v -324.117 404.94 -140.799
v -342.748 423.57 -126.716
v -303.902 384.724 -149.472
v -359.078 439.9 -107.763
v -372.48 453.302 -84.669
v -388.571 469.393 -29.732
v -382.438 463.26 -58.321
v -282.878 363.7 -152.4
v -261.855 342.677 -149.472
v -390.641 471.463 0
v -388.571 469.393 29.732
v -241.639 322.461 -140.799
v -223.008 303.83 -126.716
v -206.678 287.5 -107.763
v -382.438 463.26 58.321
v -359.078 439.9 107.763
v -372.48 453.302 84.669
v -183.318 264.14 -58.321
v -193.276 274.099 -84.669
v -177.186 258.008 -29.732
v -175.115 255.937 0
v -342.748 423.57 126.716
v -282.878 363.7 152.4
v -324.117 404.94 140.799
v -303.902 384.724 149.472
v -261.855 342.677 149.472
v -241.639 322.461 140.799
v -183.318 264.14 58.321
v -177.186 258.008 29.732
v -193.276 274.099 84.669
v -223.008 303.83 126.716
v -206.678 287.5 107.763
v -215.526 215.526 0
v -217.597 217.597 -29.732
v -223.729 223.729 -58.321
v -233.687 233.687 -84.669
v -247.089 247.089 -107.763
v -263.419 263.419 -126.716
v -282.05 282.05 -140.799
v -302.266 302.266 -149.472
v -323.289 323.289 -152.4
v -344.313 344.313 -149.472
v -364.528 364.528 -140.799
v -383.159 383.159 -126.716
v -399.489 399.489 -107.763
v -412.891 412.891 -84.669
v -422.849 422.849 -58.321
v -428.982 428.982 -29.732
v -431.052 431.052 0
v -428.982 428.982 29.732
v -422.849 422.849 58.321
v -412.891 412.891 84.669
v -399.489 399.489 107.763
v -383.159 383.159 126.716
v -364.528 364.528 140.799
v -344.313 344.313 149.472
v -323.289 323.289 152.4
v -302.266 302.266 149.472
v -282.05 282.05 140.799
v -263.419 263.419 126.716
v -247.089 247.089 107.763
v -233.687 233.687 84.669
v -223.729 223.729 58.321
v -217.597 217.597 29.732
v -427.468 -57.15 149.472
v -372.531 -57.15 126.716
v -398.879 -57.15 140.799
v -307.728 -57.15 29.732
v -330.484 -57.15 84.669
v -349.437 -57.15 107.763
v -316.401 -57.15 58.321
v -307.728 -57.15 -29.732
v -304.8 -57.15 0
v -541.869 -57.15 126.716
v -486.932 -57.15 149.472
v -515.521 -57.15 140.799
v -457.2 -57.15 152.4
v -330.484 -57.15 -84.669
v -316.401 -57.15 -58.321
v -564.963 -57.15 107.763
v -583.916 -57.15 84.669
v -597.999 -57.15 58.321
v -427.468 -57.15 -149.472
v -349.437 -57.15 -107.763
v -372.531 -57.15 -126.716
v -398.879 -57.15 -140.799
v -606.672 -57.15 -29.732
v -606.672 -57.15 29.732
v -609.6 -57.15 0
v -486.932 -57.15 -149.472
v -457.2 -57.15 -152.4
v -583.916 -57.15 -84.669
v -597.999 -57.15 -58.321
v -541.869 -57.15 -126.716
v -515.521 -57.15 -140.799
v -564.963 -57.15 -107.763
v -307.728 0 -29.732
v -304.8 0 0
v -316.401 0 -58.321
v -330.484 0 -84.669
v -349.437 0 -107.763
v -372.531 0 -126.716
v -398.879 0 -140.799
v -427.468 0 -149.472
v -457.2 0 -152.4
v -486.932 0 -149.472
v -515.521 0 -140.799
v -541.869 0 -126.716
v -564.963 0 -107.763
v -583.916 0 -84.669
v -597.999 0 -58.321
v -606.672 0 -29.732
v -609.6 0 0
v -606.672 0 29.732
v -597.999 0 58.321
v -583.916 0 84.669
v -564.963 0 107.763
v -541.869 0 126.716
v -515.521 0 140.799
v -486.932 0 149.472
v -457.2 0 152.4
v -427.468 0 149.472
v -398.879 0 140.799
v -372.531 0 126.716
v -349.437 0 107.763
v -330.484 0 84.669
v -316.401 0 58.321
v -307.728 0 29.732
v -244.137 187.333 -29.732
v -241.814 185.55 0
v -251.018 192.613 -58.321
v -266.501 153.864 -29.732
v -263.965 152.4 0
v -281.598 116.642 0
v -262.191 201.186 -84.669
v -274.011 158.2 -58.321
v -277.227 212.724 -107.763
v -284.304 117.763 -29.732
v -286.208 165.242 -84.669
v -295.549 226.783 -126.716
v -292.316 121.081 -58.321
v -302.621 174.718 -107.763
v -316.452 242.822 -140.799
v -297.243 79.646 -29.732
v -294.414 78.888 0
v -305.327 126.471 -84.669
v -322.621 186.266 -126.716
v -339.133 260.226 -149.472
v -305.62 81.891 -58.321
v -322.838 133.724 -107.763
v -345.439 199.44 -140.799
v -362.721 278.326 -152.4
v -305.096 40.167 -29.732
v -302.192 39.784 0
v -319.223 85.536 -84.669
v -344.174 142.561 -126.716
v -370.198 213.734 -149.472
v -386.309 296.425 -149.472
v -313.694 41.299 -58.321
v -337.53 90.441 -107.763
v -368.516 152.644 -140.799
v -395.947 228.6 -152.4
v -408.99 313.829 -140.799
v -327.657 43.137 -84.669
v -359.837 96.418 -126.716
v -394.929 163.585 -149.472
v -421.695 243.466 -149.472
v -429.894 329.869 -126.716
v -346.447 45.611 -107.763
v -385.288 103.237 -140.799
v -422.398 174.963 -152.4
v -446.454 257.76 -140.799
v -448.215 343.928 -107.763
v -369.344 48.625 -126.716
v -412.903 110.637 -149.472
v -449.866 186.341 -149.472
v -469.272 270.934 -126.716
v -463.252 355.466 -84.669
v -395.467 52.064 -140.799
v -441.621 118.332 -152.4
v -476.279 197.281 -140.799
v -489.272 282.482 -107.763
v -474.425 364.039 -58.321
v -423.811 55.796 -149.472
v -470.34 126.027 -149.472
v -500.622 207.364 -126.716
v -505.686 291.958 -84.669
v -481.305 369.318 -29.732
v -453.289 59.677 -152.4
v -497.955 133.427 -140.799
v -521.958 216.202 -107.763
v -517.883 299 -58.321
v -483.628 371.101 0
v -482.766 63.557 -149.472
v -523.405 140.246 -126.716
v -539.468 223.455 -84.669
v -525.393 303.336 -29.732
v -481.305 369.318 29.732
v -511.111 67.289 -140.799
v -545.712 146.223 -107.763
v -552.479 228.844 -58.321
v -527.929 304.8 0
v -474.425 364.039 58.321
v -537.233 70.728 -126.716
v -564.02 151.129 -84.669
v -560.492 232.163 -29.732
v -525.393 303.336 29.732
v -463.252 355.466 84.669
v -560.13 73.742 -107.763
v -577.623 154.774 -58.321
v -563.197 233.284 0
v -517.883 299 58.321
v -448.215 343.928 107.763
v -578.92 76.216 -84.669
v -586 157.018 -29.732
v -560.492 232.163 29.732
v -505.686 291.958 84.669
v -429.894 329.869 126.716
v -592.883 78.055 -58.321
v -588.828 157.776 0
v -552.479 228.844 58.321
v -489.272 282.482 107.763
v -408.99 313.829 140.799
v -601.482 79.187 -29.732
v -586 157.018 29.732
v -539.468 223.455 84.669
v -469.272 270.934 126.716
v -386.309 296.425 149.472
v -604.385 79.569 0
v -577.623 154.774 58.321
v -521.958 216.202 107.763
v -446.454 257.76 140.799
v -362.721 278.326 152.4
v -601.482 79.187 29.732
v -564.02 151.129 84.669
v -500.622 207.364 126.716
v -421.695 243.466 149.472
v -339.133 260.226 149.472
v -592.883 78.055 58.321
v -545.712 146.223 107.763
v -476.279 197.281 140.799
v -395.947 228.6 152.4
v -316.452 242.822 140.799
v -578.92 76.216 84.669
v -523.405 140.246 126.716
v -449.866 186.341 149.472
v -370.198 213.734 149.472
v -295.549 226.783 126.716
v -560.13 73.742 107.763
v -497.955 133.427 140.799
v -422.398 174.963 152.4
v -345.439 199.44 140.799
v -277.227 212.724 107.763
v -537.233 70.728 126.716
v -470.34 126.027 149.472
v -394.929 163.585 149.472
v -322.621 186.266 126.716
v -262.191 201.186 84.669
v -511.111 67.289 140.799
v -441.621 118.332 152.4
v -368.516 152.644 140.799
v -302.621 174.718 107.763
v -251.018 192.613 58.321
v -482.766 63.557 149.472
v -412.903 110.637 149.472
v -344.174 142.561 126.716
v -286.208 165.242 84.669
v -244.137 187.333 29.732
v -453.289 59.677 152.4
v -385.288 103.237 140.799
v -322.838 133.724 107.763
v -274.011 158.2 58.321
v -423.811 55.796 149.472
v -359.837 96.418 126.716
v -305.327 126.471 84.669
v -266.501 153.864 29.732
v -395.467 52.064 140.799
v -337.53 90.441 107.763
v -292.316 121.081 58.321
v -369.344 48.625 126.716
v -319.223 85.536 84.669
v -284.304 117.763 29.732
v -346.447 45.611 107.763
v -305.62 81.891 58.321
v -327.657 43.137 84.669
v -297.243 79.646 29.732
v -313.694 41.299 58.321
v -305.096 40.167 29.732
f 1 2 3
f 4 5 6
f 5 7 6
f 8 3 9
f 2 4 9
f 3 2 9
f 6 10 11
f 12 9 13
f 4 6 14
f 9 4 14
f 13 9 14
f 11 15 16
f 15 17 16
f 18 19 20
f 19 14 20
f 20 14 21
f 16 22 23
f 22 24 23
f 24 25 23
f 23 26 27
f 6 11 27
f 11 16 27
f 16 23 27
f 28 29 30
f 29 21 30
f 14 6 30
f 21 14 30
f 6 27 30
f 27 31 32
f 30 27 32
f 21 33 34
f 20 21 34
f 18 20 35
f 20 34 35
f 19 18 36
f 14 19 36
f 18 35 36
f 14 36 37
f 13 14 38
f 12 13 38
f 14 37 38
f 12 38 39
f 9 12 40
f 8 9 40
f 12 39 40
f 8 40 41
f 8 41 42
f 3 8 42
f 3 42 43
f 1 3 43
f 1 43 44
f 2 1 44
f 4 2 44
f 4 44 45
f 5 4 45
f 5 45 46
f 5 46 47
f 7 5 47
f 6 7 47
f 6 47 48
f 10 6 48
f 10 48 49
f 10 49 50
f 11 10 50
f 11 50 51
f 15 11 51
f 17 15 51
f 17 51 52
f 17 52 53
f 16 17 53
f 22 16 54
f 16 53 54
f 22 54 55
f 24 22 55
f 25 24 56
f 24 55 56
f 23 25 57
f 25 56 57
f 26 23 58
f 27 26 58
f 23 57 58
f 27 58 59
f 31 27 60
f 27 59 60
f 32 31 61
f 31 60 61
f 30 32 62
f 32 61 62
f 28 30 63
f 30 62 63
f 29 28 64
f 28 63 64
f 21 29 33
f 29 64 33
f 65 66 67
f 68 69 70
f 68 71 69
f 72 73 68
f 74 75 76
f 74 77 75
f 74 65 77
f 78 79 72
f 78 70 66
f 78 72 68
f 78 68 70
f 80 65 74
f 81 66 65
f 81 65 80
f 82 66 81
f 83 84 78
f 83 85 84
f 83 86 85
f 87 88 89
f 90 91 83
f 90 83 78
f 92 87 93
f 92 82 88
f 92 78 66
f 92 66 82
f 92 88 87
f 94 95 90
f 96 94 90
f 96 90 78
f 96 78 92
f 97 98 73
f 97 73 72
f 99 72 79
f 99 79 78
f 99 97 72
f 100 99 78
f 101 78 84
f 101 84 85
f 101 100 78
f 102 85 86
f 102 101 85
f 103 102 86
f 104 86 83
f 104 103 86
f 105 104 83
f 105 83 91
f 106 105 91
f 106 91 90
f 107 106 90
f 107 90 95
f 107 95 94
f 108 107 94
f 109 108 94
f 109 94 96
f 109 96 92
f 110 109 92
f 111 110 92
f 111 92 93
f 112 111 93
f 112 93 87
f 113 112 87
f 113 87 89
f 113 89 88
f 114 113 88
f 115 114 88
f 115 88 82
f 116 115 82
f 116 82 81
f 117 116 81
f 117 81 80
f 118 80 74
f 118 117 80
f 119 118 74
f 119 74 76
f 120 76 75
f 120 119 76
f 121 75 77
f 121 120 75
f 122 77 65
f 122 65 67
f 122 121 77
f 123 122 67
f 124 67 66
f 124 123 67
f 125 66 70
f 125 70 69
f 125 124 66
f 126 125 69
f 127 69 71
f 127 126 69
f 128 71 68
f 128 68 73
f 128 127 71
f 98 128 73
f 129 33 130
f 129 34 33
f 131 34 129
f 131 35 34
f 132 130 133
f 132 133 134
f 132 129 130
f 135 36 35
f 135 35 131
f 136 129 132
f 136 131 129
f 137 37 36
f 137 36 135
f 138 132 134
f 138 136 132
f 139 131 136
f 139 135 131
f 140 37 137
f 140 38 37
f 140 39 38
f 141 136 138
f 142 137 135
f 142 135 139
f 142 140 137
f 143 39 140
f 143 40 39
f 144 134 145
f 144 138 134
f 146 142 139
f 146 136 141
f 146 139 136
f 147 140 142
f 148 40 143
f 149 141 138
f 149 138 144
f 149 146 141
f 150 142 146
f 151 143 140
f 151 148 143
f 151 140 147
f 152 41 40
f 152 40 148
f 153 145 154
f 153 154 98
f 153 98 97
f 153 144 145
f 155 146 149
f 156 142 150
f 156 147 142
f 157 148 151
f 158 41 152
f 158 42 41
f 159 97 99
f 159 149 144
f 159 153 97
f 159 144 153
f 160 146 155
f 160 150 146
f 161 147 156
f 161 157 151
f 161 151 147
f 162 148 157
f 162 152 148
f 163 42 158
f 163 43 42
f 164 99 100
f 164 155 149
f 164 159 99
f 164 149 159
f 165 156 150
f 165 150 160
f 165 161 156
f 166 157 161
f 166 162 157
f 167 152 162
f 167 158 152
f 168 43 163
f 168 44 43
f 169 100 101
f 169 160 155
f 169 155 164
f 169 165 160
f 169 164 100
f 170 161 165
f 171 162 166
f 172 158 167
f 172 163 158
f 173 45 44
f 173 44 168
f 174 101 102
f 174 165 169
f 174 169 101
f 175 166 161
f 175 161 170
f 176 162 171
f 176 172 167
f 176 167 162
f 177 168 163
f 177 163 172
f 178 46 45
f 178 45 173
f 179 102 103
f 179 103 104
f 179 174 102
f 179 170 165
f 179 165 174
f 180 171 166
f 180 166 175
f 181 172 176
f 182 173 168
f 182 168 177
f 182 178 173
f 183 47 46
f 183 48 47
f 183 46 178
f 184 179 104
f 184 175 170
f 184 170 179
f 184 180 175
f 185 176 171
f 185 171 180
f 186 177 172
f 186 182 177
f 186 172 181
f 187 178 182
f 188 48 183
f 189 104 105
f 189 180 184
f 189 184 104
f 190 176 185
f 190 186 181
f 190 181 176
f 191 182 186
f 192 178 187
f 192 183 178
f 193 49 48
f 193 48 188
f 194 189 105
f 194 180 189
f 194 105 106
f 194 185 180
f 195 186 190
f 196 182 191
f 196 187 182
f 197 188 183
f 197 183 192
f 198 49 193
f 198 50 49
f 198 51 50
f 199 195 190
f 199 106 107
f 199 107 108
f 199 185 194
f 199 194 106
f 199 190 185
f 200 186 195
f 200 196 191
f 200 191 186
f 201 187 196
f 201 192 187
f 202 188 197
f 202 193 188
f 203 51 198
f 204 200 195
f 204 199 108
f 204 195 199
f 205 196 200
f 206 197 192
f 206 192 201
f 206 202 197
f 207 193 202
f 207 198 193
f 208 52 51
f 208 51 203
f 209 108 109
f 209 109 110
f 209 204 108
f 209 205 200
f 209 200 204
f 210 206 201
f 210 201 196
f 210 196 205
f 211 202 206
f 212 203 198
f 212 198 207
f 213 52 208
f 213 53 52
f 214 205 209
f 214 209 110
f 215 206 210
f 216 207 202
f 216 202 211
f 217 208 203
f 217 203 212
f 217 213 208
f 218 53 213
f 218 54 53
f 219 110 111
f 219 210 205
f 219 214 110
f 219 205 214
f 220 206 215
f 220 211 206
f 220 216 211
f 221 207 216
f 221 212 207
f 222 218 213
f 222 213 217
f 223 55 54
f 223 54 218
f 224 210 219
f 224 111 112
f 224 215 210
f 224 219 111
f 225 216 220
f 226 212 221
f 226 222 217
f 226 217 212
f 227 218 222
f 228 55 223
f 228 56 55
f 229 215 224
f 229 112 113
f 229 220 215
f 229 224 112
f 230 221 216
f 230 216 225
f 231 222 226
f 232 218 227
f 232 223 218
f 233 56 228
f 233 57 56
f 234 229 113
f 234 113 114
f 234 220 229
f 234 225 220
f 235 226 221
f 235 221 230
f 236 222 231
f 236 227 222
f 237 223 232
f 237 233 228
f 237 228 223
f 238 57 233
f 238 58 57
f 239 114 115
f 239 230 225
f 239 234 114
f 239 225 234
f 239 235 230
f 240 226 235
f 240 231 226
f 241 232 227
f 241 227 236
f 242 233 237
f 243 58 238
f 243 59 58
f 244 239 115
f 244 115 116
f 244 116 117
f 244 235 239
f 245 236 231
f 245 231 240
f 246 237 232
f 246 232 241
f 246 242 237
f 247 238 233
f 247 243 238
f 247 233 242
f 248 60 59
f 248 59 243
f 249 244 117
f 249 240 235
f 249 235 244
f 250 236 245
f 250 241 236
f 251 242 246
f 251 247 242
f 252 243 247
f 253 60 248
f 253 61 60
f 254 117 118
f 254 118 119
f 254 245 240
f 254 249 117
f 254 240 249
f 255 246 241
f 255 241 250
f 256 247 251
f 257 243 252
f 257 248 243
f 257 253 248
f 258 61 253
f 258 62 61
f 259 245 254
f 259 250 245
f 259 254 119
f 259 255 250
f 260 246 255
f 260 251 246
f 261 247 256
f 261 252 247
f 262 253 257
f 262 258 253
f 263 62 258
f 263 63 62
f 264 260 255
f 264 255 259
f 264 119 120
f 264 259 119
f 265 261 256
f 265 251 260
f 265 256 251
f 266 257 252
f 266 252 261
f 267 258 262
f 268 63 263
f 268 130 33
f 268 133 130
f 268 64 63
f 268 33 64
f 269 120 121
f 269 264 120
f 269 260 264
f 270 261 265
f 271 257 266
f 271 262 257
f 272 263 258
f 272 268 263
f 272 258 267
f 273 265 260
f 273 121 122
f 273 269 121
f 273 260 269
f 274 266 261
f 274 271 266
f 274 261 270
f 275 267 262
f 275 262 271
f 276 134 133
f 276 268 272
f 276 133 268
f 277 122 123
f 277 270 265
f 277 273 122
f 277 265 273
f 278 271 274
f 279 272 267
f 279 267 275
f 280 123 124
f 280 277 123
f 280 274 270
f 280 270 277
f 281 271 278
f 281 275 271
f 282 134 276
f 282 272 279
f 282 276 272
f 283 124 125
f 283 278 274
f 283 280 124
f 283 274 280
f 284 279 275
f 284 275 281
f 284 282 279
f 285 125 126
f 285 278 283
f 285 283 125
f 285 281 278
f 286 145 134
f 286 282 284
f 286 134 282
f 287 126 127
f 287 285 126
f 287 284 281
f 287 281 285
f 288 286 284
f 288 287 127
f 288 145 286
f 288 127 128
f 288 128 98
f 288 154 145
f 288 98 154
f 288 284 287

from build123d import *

# Parameters (mm, degrees)
F0_R     = 152.4
F3_DEPTH = 57.15
F4_DEPTH = 57.15


with BuildPart() as f2:
    # F2: sweep along a path in F1
    with BuildLine(Plane.XY) as f2_path:
        ThreePointArc((-323.2892203585, 323.2892203585), (-422.3977222642, 174.9628652773), (-457.2, 0))
    # F0 (on Front) → F2 (sweep)
    with BuildSketch(Plane.XZ):
        with Locations((-457.2, 0)):
            Circle(F0_R)
    sweep(path=f2_path.line)

    # F3 (add): a face of the model
    f3_faces = [f2.faces().sort_by_distance(p)[0] for p in [
        (-457.2, 0, 0),
    ]]
    extrude(f3_faces, amount=F3_DEPTH)

    # F4 (add): a face of the model
    f4_faces = [f2.faces().sort_by_distance(p)[0] for p in [
        (-323.2892203585, 323.2892203585, 0),
    ]]
    extrude(f4_faces, amount=F4_DEPTH)


solid = f2.part
